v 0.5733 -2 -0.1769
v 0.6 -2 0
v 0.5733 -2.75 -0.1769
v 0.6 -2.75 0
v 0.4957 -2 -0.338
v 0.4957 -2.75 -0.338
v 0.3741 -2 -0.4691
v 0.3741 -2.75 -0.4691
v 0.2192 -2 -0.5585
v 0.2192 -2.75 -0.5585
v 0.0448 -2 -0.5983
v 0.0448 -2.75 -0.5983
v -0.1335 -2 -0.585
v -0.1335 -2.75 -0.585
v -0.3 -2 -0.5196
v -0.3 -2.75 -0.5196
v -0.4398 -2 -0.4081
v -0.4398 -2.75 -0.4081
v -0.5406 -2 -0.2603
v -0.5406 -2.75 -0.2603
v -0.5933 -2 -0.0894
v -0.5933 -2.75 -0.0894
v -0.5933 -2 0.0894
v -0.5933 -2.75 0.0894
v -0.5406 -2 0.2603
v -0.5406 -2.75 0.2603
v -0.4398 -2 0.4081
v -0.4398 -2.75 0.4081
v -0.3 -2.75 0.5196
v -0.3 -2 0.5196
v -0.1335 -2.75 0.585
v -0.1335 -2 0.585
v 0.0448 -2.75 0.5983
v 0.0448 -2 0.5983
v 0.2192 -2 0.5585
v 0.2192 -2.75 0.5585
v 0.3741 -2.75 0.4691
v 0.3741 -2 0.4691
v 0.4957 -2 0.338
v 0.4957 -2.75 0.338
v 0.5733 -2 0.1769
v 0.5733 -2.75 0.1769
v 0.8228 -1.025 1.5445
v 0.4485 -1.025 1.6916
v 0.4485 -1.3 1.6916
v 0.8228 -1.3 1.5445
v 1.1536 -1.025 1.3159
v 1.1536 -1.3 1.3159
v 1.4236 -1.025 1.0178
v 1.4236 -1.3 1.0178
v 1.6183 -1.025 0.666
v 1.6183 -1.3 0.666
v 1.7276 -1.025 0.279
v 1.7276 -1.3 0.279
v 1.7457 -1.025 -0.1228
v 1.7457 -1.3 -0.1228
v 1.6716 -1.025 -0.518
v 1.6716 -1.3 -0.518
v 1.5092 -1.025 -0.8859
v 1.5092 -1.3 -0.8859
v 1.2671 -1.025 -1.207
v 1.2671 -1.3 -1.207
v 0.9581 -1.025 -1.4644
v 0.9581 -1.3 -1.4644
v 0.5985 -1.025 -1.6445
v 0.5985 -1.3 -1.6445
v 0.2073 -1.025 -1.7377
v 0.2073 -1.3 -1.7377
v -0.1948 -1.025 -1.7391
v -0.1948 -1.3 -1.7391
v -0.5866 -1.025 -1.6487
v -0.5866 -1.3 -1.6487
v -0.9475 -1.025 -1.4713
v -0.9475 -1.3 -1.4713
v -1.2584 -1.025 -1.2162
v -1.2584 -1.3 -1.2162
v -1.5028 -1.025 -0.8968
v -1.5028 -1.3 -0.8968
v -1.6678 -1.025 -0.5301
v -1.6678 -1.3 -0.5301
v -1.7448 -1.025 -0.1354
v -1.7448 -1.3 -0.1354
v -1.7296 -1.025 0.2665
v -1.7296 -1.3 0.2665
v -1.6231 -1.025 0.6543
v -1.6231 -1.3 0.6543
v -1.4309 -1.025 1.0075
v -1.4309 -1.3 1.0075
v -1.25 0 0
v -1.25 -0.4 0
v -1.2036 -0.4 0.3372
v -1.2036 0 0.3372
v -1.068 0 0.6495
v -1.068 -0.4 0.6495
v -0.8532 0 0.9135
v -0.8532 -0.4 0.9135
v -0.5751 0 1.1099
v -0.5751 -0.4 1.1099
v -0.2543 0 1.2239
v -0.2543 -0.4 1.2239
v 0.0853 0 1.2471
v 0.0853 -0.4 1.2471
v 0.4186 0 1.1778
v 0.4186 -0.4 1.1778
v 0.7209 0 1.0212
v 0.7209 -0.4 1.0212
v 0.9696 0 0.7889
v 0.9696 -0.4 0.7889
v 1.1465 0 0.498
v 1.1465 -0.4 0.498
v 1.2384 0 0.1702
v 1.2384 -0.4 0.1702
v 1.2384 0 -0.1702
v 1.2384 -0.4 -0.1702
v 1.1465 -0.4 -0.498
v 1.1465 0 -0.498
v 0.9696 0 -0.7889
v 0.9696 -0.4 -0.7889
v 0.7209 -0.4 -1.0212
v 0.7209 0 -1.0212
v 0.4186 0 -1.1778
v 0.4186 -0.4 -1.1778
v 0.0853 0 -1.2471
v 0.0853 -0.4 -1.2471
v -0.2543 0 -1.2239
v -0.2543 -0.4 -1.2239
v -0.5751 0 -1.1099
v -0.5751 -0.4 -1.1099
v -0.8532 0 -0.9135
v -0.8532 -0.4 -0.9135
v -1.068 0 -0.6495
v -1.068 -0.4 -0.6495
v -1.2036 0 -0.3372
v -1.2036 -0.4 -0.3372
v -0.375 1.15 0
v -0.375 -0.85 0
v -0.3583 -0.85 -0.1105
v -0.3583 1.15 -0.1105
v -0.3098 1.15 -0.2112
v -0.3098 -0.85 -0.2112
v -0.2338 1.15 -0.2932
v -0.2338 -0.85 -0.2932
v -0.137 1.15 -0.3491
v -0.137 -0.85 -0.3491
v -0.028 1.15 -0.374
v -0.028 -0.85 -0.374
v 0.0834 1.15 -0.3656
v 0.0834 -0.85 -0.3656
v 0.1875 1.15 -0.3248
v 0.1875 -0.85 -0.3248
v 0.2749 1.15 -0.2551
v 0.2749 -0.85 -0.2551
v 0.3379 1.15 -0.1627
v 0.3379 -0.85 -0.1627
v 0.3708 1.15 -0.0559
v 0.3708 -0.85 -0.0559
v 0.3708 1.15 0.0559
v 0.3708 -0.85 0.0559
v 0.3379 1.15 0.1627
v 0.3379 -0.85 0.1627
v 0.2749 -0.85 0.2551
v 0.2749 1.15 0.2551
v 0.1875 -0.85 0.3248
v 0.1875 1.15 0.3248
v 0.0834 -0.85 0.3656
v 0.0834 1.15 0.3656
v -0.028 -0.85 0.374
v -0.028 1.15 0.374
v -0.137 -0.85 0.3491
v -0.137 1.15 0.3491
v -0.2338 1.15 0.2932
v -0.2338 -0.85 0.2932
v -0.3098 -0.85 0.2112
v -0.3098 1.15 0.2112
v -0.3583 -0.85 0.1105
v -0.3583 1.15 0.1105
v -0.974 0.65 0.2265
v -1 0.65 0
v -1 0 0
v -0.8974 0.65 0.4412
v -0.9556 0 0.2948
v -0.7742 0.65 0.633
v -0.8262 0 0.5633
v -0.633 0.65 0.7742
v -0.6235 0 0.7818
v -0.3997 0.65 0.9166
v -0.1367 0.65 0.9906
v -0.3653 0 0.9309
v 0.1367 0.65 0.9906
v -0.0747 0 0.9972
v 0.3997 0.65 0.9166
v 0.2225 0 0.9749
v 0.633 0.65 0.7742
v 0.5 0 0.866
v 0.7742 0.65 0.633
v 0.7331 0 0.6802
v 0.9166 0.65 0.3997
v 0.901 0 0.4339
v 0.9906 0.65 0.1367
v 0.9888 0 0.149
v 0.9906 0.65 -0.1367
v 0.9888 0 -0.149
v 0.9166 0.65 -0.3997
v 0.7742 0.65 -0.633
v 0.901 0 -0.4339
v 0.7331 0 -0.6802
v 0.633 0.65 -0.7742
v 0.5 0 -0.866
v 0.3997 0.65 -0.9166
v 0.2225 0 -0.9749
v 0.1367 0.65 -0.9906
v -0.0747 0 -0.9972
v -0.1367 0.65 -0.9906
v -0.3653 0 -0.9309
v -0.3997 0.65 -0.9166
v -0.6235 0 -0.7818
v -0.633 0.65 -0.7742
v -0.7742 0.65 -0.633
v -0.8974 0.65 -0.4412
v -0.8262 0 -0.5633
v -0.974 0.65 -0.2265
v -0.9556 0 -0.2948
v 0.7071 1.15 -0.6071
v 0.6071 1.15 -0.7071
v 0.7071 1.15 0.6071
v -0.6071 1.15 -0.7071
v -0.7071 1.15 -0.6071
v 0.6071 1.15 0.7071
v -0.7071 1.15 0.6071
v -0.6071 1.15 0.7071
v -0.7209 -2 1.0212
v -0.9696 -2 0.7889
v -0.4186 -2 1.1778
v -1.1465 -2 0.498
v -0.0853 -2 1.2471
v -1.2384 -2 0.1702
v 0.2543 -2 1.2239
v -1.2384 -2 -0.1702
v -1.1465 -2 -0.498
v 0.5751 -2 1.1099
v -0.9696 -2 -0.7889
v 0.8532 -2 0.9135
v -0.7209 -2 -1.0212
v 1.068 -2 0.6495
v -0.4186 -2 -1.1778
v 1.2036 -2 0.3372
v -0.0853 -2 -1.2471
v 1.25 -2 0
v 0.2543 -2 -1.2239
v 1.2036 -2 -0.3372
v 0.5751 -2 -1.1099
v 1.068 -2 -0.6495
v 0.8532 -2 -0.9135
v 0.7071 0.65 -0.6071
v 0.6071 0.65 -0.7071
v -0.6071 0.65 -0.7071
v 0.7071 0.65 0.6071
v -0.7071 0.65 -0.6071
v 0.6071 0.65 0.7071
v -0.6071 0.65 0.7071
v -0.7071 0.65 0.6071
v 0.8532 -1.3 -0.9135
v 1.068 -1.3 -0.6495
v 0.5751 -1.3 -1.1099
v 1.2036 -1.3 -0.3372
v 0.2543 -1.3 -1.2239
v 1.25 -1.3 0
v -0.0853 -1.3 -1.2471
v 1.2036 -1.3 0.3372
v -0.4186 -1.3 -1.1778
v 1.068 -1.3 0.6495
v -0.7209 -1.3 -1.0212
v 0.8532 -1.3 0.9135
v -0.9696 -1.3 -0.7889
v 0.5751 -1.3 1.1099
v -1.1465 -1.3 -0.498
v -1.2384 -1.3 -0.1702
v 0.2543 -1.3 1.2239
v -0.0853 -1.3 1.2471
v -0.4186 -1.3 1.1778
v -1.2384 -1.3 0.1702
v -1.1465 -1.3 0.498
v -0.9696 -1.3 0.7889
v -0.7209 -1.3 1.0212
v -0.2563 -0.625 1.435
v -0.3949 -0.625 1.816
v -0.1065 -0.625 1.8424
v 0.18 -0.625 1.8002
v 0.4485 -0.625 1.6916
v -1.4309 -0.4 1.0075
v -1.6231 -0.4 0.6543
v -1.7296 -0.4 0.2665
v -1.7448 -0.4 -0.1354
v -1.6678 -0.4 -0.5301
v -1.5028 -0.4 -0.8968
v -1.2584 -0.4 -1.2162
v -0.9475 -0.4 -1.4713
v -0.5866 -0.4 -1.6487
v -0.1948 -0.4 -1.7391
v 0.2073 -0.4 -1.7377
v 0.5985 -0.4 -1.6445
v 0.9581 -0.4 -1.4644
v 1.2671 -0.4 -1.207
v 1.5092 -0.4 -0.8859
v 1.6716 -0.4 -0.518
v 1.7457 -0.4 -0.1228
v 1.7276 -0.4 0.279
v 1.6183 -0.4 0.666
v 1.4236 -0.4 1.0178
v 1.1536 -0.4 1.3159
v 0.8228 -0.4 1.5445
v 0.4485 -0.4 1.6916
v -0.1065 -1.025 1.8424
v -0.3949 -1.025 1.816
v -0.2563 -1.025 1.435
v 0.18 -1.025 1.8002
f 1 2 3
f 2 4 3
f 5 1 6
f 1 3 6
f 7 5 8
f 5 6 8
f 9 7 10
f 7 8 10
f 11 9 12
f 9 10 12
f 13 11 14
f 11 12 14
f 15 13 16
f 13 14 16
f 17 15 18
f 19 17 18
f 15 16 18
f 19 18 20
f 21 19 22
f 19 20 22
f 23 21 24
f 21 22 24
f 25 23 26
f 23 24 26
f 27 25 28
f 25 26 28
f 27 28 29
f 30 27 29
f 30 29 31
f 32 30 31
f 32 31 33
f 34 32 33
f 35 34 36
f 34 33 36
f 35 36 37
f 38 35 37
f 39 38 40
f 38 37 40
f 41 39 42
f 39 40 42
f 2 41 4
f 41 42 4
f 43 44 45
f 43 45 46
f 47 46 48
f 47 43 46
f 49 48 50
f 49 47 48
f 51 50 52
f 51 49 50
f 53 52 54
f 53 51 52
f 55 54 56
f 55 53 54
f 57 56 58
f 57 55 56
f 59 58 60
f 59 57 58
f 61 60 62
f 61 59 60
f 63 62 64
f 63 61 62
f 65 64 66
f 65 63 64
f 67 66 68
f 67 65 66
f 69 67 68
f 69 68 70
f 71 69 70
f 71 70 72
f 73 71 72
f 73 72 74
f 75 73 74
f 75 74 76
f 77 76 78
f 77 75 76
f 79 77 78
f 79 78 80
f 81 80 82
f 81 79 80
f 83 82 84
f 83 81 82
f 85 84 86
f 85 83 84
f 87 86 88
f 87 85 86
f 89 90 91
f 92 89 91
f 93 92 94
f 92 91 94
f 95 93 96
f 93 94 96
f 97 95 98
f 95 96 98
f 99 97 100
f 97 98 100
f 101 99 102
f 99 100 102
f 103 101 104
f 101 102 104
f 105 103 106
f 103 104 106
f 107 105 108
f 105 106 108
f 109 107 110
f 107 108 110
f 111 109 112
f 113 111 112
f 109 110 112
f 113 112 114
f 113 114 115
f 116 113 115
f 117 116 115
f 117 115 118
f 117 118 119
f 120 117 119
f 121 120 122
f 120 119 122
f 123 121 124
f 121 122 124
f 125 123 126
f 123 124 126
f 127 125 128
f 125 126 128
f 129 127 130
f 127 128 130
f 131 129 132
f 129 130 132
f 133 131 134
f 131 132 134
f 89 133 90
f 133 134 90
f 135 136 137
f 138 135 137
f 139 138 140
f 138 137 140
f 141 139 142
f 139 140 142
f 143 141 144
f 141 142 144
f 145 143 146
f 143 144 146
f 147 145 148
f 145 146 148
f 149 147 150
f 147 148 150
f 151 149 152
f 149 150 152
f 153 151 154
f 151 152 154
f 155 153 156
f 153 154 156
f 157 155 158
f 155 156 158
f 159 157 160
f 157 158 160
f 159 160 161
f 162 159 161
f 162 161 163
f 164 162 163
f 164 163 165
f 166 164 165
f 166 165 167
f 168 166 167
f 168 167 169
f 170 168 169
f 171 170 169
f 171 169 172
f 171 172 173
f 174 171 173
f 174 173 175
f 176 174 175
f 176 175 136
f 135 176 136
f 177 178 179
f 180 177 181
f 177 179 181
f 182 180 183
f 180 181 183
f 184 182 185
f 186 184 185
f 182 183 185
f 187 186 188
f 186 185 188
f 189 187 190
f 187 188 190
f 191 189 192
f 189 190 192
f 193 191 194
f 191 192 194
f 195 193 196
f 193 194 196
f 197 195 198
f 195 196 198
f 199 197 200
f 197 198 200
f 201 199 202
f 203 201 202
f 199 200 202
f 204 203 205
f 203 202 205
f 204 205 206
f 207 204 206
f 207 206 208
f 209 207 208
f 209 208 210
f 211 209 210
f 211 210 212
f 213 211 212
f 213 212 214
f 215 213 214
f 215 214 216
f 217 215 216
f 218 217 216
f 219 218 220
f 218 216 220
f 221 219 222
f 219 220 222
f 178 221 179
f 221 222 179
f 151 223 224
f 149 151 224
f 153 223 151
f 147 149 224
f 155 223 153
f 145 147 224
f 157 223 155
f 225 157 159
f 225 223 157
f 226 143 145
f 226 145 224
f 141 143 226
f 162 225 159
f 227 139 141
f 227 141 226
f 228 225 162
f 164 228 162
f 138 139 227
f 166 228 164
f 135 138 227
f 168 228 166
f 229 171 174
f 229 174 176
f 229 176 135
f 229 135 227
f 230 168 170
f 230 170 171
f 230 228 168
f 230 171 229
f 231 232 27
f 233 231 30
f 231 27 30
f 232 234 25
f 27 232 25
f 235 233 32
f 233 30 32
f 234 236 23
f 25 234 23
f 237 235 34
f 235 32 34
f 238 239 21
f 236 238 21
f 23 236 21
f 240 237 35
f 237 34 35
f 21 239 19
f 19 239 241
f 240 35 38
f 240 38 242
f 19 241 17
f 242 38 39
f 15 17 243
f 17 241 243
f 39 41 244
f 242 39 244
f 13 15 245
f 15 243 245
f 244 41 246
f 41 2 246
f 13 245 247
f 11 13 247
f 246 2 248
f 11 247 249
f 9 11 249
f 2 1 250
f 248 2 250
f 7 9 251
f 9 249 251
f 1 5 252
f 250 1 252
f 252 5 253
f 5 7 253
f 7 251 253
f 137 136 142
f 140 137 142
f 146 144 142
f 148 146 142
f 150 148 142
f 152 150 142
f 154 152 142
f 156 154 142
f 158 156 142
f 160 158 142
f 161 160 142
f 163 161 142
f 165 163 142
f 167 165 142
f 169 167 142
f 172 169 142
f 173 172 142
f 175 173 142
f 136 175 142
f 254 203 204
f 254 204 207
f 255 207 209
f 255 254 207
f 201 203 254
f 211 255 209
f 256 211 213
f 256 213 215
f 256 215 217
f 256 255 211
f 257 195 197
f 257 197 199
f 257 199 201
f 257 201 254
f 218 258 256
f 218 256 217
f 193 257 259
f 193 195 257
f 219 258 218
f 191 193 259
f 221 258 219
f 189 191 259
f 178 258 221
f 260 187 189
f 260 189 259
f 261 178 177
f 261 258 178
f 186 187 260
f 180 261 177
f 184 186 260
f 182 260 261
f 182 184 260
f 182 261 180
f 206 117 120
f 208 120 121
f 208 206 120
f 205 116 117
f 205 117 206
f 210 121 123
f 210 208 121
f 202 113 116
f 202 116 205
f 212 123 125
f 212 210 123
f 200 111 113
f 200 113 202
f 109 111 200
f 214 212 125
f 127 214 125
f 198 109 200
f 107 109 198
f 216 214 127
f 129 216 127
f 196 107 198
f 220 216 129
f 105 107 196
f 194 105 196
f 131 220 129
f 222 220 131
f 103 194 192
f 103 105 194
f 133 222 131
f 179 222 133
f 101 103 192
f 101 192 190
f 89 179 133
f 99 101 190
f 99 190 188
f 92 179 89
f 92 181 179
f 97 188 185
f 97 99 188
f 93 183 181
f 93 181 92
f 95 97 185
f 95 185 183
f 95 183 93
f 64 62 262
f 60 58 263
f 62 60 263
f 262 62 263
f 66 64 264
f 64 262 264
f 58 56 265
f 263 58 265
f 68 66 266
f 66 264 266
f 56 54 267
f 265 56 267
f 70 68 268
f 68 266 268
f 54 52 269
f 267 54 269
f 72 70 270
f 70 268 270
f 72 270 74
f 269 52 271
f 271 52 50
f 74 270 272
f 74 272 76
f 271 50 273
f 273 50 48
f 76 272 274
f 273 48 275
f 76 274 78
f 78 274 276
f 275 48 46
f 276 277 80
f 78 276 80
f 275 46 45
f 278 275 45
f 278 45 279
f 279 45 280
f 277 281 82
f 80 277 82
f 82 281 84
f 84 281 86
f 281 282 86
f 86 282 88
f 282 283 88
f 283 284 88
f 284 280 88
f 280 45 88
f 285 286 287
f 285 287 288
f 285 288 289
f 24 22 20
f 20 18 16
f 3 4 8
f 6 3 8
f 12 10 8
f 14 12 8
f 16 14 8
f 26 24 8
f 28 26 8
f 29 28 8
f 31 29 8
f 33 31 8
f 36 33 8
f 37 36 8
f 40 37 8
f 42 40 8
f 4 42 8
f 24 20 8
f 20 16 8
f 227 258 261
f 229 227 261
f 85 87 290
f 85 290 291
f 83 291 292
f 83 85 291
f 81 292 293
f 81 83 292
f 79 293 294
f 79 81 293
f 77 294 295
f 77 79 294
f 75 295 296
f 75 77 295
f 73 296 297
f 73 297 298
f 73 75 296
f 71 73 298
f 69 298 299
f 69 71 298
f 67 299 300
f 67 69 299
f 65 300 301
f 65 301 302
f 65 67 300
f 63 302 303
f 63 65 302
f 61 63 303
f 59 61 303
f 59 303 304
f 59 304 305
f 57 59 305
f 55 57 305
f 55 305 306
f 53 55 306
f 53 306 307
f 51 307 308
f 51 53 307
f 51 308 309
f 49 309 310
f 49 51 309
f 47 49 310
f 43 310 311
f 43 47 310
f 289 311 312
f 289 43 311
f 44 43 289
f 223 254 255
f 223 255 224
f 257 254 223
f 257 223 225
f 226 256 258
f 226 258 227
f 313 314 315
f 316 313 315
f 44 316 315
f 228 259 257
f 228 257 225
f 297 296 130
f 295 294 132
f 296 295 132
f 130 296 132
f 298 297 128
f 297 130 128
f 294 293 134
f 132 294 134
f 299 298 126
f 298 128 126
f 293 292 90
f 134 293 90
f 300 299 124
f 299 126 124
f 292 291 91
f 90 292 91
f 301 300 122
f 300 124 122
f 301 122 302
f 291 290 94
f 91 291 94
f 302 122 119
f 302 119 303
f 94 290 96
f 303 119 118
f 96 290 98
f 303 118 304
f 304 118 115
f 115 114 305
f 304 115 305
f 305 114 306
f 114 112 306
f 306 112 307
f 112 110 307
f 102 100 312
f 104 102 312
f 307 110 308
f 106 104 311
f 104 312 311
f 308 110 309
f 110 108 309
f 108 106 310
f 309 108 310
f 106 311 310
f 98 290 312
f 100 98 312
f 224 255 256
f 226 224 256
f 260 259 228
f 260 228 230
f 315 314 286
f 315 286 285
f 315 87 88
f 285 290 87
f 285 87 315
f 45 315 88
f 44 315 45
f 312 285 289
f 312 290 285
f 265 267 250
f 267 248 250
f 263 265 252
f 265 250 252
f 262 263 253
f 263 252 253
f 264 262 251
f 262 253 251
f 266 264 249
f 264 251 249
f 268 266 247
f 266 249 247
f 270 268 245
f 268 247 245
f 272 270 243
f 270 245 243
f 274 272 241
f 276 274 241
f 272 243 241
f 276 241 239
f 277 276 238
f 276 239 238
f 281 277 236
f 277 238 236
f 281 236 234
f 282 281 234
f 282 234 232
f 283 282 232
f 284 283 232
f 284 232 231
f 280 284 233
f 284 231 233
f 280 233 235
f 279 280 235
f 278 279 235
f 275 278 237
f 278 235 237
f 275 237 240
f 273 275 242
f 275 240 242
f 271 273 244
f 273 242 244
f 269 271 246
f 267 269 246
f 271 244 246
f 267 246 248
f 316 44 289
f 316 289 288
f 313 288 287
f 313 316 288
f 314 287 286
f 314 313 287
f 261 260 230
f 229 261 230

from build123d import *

# Parameters (mm, degrees)
BOSS_EXTRUDE1_DEPTH = 0.625
SKETCH2_R           = 1.25
BOSS_EXTRUDE2_DEPTH = 0.4
SKETCH3_R           = 1
BOSS_EXTRUDE3_DEPTH = 0.65
SKETCH4_W           = 1.414213562
SKETCH4_H           = 1.414213562
BOSS_EXTRUDE4_DEPTH = 0.5
BOSS_EXTRUDE5_DEPTH = 0.4
BOSS_EXTRUDE6_DEPTH = 0.275
HOLE1_D             = 0.75
HOLE1_DEPTH         = 2
CHAMFER1_SIZE       = 0.1


with BuildPart() as part:
    # Sketch1 → Boss-Extrude1 (new body)
    with BuildSketch(Plane.XZ.offset(1.025)):
        with BuildLine():
            Line((0.448503586, 1.691550925), (-1.430881656, 1.007510639))
            ThreePointArc((-1.430881656, 1.007510639), (0.598535251, -1.644462086), (0.448503586, 1.691550925))
        make_face()
    extrude(amount=-BOSS_EXTRUDE1_DEPTH)

    # Sketch2 → Boss-Extrude2 (add)
    with BuildSketch(Plane(origin=(0, -0.4, 0), x_dir=(-1, 0, 0), z_dir=(0, 1, 0))):
        Circle(SKETCH2_R)
    extrude(amount=BOSS_EXTRUDE2_DEPTH)

    # Sketch3 → Boss-Extrude3 (add)
    with BuildSketch(Plane(origin=(0, 0, 0), x_dir=(-1, 0, 0), z_dir=(0, 1, 0))):
        Circle(SKETCH3_R)
    extrude(amount=BOSS_EXTRUDE3_DEPTH)

    # Sketch4 → Boss-Extrude4 (add)
    with BuildSketch(Plane(origin=(0, 0.65, 0), x_dir=(-1, 0, 0), z_dir=(0, 1, 0))):
        Rectangle(SKETCH4_W, SKETCH4_H)
    extrude(amount=BOSS_EXTRUDE4_DEPTH)

    # Sketch5 → Boss-Extrude5 (add)
    with BuildSketch(Plane.XZ.offset(1.025)):
        with BuildLine():
            Line((-0.394915124, 1.815971484), (-0.25626588, 1.435035818))
            Line((-0.25626588, 1.435035818), (0.448503586, 1.691550925))
            ThreePointArc((0.448503586, 1.691550925), (0.038013824, 1.829816276), (-0.394915124, 1.815971484))
        make_face()
    extrude(amount=-BOSS_EXTRUDE5_DEPTH)

    # Sketch6 → Boss-Extrude6 (add)
    with BuildSketch(Plane.XZ.offset(1.025)):
        with BuildLine():
            Line((-1.430881656, 1.007510639), (0.448503586, 1.691550925))
            ThreePointArc((0.448503586, 1.691550925), (0.598535251, -1.644462086), (-1.430881656, 1.007510639))
        make_face()
    extrude(amount=BOSS_EXTRUDE6_DEPTH)

    # Sketch7 → Revolve1 (revolve)
    with BuildSketch(Plane(origin=(0, 0, 0), x_dir=(-1, 0, 0), z_dir=(0, 0, -1))):
        Polygon((-0.6, -2.75), (0, -2.75), (0, -1.3), (-1.25, -1.3), (-1.25, -2), (-0.6, -2), align=None)
    revolve(axis=Axis((0, -2.75, 0), (0, 1, 0)))

    # Hole1
    with Locations(Plane(origin=(0, 1.15, 0), x_dir=(1, 0, 0), z_dir=(0, 1, 0))):
        with Locations((0, 0)):
            Hole(HOLE1_D / 2, depth=HOLE1_DEPTH)

    # Chamfer1
    chamfer1_edges = [part.edges().sort_by_distance(p)[0] for p in [
        (-0.707106781, 0.9, 0.707106781),
        (0.707106781, 0.9, 0.707106781),
        (0.707106781, 0.9, -0.707106781),
        (-0.707106781, 0.9, -0.707106781),
    ]]
    chamfer(chamfer1_edges, length=CHAMFER1_SIZE)


solid = part.part
